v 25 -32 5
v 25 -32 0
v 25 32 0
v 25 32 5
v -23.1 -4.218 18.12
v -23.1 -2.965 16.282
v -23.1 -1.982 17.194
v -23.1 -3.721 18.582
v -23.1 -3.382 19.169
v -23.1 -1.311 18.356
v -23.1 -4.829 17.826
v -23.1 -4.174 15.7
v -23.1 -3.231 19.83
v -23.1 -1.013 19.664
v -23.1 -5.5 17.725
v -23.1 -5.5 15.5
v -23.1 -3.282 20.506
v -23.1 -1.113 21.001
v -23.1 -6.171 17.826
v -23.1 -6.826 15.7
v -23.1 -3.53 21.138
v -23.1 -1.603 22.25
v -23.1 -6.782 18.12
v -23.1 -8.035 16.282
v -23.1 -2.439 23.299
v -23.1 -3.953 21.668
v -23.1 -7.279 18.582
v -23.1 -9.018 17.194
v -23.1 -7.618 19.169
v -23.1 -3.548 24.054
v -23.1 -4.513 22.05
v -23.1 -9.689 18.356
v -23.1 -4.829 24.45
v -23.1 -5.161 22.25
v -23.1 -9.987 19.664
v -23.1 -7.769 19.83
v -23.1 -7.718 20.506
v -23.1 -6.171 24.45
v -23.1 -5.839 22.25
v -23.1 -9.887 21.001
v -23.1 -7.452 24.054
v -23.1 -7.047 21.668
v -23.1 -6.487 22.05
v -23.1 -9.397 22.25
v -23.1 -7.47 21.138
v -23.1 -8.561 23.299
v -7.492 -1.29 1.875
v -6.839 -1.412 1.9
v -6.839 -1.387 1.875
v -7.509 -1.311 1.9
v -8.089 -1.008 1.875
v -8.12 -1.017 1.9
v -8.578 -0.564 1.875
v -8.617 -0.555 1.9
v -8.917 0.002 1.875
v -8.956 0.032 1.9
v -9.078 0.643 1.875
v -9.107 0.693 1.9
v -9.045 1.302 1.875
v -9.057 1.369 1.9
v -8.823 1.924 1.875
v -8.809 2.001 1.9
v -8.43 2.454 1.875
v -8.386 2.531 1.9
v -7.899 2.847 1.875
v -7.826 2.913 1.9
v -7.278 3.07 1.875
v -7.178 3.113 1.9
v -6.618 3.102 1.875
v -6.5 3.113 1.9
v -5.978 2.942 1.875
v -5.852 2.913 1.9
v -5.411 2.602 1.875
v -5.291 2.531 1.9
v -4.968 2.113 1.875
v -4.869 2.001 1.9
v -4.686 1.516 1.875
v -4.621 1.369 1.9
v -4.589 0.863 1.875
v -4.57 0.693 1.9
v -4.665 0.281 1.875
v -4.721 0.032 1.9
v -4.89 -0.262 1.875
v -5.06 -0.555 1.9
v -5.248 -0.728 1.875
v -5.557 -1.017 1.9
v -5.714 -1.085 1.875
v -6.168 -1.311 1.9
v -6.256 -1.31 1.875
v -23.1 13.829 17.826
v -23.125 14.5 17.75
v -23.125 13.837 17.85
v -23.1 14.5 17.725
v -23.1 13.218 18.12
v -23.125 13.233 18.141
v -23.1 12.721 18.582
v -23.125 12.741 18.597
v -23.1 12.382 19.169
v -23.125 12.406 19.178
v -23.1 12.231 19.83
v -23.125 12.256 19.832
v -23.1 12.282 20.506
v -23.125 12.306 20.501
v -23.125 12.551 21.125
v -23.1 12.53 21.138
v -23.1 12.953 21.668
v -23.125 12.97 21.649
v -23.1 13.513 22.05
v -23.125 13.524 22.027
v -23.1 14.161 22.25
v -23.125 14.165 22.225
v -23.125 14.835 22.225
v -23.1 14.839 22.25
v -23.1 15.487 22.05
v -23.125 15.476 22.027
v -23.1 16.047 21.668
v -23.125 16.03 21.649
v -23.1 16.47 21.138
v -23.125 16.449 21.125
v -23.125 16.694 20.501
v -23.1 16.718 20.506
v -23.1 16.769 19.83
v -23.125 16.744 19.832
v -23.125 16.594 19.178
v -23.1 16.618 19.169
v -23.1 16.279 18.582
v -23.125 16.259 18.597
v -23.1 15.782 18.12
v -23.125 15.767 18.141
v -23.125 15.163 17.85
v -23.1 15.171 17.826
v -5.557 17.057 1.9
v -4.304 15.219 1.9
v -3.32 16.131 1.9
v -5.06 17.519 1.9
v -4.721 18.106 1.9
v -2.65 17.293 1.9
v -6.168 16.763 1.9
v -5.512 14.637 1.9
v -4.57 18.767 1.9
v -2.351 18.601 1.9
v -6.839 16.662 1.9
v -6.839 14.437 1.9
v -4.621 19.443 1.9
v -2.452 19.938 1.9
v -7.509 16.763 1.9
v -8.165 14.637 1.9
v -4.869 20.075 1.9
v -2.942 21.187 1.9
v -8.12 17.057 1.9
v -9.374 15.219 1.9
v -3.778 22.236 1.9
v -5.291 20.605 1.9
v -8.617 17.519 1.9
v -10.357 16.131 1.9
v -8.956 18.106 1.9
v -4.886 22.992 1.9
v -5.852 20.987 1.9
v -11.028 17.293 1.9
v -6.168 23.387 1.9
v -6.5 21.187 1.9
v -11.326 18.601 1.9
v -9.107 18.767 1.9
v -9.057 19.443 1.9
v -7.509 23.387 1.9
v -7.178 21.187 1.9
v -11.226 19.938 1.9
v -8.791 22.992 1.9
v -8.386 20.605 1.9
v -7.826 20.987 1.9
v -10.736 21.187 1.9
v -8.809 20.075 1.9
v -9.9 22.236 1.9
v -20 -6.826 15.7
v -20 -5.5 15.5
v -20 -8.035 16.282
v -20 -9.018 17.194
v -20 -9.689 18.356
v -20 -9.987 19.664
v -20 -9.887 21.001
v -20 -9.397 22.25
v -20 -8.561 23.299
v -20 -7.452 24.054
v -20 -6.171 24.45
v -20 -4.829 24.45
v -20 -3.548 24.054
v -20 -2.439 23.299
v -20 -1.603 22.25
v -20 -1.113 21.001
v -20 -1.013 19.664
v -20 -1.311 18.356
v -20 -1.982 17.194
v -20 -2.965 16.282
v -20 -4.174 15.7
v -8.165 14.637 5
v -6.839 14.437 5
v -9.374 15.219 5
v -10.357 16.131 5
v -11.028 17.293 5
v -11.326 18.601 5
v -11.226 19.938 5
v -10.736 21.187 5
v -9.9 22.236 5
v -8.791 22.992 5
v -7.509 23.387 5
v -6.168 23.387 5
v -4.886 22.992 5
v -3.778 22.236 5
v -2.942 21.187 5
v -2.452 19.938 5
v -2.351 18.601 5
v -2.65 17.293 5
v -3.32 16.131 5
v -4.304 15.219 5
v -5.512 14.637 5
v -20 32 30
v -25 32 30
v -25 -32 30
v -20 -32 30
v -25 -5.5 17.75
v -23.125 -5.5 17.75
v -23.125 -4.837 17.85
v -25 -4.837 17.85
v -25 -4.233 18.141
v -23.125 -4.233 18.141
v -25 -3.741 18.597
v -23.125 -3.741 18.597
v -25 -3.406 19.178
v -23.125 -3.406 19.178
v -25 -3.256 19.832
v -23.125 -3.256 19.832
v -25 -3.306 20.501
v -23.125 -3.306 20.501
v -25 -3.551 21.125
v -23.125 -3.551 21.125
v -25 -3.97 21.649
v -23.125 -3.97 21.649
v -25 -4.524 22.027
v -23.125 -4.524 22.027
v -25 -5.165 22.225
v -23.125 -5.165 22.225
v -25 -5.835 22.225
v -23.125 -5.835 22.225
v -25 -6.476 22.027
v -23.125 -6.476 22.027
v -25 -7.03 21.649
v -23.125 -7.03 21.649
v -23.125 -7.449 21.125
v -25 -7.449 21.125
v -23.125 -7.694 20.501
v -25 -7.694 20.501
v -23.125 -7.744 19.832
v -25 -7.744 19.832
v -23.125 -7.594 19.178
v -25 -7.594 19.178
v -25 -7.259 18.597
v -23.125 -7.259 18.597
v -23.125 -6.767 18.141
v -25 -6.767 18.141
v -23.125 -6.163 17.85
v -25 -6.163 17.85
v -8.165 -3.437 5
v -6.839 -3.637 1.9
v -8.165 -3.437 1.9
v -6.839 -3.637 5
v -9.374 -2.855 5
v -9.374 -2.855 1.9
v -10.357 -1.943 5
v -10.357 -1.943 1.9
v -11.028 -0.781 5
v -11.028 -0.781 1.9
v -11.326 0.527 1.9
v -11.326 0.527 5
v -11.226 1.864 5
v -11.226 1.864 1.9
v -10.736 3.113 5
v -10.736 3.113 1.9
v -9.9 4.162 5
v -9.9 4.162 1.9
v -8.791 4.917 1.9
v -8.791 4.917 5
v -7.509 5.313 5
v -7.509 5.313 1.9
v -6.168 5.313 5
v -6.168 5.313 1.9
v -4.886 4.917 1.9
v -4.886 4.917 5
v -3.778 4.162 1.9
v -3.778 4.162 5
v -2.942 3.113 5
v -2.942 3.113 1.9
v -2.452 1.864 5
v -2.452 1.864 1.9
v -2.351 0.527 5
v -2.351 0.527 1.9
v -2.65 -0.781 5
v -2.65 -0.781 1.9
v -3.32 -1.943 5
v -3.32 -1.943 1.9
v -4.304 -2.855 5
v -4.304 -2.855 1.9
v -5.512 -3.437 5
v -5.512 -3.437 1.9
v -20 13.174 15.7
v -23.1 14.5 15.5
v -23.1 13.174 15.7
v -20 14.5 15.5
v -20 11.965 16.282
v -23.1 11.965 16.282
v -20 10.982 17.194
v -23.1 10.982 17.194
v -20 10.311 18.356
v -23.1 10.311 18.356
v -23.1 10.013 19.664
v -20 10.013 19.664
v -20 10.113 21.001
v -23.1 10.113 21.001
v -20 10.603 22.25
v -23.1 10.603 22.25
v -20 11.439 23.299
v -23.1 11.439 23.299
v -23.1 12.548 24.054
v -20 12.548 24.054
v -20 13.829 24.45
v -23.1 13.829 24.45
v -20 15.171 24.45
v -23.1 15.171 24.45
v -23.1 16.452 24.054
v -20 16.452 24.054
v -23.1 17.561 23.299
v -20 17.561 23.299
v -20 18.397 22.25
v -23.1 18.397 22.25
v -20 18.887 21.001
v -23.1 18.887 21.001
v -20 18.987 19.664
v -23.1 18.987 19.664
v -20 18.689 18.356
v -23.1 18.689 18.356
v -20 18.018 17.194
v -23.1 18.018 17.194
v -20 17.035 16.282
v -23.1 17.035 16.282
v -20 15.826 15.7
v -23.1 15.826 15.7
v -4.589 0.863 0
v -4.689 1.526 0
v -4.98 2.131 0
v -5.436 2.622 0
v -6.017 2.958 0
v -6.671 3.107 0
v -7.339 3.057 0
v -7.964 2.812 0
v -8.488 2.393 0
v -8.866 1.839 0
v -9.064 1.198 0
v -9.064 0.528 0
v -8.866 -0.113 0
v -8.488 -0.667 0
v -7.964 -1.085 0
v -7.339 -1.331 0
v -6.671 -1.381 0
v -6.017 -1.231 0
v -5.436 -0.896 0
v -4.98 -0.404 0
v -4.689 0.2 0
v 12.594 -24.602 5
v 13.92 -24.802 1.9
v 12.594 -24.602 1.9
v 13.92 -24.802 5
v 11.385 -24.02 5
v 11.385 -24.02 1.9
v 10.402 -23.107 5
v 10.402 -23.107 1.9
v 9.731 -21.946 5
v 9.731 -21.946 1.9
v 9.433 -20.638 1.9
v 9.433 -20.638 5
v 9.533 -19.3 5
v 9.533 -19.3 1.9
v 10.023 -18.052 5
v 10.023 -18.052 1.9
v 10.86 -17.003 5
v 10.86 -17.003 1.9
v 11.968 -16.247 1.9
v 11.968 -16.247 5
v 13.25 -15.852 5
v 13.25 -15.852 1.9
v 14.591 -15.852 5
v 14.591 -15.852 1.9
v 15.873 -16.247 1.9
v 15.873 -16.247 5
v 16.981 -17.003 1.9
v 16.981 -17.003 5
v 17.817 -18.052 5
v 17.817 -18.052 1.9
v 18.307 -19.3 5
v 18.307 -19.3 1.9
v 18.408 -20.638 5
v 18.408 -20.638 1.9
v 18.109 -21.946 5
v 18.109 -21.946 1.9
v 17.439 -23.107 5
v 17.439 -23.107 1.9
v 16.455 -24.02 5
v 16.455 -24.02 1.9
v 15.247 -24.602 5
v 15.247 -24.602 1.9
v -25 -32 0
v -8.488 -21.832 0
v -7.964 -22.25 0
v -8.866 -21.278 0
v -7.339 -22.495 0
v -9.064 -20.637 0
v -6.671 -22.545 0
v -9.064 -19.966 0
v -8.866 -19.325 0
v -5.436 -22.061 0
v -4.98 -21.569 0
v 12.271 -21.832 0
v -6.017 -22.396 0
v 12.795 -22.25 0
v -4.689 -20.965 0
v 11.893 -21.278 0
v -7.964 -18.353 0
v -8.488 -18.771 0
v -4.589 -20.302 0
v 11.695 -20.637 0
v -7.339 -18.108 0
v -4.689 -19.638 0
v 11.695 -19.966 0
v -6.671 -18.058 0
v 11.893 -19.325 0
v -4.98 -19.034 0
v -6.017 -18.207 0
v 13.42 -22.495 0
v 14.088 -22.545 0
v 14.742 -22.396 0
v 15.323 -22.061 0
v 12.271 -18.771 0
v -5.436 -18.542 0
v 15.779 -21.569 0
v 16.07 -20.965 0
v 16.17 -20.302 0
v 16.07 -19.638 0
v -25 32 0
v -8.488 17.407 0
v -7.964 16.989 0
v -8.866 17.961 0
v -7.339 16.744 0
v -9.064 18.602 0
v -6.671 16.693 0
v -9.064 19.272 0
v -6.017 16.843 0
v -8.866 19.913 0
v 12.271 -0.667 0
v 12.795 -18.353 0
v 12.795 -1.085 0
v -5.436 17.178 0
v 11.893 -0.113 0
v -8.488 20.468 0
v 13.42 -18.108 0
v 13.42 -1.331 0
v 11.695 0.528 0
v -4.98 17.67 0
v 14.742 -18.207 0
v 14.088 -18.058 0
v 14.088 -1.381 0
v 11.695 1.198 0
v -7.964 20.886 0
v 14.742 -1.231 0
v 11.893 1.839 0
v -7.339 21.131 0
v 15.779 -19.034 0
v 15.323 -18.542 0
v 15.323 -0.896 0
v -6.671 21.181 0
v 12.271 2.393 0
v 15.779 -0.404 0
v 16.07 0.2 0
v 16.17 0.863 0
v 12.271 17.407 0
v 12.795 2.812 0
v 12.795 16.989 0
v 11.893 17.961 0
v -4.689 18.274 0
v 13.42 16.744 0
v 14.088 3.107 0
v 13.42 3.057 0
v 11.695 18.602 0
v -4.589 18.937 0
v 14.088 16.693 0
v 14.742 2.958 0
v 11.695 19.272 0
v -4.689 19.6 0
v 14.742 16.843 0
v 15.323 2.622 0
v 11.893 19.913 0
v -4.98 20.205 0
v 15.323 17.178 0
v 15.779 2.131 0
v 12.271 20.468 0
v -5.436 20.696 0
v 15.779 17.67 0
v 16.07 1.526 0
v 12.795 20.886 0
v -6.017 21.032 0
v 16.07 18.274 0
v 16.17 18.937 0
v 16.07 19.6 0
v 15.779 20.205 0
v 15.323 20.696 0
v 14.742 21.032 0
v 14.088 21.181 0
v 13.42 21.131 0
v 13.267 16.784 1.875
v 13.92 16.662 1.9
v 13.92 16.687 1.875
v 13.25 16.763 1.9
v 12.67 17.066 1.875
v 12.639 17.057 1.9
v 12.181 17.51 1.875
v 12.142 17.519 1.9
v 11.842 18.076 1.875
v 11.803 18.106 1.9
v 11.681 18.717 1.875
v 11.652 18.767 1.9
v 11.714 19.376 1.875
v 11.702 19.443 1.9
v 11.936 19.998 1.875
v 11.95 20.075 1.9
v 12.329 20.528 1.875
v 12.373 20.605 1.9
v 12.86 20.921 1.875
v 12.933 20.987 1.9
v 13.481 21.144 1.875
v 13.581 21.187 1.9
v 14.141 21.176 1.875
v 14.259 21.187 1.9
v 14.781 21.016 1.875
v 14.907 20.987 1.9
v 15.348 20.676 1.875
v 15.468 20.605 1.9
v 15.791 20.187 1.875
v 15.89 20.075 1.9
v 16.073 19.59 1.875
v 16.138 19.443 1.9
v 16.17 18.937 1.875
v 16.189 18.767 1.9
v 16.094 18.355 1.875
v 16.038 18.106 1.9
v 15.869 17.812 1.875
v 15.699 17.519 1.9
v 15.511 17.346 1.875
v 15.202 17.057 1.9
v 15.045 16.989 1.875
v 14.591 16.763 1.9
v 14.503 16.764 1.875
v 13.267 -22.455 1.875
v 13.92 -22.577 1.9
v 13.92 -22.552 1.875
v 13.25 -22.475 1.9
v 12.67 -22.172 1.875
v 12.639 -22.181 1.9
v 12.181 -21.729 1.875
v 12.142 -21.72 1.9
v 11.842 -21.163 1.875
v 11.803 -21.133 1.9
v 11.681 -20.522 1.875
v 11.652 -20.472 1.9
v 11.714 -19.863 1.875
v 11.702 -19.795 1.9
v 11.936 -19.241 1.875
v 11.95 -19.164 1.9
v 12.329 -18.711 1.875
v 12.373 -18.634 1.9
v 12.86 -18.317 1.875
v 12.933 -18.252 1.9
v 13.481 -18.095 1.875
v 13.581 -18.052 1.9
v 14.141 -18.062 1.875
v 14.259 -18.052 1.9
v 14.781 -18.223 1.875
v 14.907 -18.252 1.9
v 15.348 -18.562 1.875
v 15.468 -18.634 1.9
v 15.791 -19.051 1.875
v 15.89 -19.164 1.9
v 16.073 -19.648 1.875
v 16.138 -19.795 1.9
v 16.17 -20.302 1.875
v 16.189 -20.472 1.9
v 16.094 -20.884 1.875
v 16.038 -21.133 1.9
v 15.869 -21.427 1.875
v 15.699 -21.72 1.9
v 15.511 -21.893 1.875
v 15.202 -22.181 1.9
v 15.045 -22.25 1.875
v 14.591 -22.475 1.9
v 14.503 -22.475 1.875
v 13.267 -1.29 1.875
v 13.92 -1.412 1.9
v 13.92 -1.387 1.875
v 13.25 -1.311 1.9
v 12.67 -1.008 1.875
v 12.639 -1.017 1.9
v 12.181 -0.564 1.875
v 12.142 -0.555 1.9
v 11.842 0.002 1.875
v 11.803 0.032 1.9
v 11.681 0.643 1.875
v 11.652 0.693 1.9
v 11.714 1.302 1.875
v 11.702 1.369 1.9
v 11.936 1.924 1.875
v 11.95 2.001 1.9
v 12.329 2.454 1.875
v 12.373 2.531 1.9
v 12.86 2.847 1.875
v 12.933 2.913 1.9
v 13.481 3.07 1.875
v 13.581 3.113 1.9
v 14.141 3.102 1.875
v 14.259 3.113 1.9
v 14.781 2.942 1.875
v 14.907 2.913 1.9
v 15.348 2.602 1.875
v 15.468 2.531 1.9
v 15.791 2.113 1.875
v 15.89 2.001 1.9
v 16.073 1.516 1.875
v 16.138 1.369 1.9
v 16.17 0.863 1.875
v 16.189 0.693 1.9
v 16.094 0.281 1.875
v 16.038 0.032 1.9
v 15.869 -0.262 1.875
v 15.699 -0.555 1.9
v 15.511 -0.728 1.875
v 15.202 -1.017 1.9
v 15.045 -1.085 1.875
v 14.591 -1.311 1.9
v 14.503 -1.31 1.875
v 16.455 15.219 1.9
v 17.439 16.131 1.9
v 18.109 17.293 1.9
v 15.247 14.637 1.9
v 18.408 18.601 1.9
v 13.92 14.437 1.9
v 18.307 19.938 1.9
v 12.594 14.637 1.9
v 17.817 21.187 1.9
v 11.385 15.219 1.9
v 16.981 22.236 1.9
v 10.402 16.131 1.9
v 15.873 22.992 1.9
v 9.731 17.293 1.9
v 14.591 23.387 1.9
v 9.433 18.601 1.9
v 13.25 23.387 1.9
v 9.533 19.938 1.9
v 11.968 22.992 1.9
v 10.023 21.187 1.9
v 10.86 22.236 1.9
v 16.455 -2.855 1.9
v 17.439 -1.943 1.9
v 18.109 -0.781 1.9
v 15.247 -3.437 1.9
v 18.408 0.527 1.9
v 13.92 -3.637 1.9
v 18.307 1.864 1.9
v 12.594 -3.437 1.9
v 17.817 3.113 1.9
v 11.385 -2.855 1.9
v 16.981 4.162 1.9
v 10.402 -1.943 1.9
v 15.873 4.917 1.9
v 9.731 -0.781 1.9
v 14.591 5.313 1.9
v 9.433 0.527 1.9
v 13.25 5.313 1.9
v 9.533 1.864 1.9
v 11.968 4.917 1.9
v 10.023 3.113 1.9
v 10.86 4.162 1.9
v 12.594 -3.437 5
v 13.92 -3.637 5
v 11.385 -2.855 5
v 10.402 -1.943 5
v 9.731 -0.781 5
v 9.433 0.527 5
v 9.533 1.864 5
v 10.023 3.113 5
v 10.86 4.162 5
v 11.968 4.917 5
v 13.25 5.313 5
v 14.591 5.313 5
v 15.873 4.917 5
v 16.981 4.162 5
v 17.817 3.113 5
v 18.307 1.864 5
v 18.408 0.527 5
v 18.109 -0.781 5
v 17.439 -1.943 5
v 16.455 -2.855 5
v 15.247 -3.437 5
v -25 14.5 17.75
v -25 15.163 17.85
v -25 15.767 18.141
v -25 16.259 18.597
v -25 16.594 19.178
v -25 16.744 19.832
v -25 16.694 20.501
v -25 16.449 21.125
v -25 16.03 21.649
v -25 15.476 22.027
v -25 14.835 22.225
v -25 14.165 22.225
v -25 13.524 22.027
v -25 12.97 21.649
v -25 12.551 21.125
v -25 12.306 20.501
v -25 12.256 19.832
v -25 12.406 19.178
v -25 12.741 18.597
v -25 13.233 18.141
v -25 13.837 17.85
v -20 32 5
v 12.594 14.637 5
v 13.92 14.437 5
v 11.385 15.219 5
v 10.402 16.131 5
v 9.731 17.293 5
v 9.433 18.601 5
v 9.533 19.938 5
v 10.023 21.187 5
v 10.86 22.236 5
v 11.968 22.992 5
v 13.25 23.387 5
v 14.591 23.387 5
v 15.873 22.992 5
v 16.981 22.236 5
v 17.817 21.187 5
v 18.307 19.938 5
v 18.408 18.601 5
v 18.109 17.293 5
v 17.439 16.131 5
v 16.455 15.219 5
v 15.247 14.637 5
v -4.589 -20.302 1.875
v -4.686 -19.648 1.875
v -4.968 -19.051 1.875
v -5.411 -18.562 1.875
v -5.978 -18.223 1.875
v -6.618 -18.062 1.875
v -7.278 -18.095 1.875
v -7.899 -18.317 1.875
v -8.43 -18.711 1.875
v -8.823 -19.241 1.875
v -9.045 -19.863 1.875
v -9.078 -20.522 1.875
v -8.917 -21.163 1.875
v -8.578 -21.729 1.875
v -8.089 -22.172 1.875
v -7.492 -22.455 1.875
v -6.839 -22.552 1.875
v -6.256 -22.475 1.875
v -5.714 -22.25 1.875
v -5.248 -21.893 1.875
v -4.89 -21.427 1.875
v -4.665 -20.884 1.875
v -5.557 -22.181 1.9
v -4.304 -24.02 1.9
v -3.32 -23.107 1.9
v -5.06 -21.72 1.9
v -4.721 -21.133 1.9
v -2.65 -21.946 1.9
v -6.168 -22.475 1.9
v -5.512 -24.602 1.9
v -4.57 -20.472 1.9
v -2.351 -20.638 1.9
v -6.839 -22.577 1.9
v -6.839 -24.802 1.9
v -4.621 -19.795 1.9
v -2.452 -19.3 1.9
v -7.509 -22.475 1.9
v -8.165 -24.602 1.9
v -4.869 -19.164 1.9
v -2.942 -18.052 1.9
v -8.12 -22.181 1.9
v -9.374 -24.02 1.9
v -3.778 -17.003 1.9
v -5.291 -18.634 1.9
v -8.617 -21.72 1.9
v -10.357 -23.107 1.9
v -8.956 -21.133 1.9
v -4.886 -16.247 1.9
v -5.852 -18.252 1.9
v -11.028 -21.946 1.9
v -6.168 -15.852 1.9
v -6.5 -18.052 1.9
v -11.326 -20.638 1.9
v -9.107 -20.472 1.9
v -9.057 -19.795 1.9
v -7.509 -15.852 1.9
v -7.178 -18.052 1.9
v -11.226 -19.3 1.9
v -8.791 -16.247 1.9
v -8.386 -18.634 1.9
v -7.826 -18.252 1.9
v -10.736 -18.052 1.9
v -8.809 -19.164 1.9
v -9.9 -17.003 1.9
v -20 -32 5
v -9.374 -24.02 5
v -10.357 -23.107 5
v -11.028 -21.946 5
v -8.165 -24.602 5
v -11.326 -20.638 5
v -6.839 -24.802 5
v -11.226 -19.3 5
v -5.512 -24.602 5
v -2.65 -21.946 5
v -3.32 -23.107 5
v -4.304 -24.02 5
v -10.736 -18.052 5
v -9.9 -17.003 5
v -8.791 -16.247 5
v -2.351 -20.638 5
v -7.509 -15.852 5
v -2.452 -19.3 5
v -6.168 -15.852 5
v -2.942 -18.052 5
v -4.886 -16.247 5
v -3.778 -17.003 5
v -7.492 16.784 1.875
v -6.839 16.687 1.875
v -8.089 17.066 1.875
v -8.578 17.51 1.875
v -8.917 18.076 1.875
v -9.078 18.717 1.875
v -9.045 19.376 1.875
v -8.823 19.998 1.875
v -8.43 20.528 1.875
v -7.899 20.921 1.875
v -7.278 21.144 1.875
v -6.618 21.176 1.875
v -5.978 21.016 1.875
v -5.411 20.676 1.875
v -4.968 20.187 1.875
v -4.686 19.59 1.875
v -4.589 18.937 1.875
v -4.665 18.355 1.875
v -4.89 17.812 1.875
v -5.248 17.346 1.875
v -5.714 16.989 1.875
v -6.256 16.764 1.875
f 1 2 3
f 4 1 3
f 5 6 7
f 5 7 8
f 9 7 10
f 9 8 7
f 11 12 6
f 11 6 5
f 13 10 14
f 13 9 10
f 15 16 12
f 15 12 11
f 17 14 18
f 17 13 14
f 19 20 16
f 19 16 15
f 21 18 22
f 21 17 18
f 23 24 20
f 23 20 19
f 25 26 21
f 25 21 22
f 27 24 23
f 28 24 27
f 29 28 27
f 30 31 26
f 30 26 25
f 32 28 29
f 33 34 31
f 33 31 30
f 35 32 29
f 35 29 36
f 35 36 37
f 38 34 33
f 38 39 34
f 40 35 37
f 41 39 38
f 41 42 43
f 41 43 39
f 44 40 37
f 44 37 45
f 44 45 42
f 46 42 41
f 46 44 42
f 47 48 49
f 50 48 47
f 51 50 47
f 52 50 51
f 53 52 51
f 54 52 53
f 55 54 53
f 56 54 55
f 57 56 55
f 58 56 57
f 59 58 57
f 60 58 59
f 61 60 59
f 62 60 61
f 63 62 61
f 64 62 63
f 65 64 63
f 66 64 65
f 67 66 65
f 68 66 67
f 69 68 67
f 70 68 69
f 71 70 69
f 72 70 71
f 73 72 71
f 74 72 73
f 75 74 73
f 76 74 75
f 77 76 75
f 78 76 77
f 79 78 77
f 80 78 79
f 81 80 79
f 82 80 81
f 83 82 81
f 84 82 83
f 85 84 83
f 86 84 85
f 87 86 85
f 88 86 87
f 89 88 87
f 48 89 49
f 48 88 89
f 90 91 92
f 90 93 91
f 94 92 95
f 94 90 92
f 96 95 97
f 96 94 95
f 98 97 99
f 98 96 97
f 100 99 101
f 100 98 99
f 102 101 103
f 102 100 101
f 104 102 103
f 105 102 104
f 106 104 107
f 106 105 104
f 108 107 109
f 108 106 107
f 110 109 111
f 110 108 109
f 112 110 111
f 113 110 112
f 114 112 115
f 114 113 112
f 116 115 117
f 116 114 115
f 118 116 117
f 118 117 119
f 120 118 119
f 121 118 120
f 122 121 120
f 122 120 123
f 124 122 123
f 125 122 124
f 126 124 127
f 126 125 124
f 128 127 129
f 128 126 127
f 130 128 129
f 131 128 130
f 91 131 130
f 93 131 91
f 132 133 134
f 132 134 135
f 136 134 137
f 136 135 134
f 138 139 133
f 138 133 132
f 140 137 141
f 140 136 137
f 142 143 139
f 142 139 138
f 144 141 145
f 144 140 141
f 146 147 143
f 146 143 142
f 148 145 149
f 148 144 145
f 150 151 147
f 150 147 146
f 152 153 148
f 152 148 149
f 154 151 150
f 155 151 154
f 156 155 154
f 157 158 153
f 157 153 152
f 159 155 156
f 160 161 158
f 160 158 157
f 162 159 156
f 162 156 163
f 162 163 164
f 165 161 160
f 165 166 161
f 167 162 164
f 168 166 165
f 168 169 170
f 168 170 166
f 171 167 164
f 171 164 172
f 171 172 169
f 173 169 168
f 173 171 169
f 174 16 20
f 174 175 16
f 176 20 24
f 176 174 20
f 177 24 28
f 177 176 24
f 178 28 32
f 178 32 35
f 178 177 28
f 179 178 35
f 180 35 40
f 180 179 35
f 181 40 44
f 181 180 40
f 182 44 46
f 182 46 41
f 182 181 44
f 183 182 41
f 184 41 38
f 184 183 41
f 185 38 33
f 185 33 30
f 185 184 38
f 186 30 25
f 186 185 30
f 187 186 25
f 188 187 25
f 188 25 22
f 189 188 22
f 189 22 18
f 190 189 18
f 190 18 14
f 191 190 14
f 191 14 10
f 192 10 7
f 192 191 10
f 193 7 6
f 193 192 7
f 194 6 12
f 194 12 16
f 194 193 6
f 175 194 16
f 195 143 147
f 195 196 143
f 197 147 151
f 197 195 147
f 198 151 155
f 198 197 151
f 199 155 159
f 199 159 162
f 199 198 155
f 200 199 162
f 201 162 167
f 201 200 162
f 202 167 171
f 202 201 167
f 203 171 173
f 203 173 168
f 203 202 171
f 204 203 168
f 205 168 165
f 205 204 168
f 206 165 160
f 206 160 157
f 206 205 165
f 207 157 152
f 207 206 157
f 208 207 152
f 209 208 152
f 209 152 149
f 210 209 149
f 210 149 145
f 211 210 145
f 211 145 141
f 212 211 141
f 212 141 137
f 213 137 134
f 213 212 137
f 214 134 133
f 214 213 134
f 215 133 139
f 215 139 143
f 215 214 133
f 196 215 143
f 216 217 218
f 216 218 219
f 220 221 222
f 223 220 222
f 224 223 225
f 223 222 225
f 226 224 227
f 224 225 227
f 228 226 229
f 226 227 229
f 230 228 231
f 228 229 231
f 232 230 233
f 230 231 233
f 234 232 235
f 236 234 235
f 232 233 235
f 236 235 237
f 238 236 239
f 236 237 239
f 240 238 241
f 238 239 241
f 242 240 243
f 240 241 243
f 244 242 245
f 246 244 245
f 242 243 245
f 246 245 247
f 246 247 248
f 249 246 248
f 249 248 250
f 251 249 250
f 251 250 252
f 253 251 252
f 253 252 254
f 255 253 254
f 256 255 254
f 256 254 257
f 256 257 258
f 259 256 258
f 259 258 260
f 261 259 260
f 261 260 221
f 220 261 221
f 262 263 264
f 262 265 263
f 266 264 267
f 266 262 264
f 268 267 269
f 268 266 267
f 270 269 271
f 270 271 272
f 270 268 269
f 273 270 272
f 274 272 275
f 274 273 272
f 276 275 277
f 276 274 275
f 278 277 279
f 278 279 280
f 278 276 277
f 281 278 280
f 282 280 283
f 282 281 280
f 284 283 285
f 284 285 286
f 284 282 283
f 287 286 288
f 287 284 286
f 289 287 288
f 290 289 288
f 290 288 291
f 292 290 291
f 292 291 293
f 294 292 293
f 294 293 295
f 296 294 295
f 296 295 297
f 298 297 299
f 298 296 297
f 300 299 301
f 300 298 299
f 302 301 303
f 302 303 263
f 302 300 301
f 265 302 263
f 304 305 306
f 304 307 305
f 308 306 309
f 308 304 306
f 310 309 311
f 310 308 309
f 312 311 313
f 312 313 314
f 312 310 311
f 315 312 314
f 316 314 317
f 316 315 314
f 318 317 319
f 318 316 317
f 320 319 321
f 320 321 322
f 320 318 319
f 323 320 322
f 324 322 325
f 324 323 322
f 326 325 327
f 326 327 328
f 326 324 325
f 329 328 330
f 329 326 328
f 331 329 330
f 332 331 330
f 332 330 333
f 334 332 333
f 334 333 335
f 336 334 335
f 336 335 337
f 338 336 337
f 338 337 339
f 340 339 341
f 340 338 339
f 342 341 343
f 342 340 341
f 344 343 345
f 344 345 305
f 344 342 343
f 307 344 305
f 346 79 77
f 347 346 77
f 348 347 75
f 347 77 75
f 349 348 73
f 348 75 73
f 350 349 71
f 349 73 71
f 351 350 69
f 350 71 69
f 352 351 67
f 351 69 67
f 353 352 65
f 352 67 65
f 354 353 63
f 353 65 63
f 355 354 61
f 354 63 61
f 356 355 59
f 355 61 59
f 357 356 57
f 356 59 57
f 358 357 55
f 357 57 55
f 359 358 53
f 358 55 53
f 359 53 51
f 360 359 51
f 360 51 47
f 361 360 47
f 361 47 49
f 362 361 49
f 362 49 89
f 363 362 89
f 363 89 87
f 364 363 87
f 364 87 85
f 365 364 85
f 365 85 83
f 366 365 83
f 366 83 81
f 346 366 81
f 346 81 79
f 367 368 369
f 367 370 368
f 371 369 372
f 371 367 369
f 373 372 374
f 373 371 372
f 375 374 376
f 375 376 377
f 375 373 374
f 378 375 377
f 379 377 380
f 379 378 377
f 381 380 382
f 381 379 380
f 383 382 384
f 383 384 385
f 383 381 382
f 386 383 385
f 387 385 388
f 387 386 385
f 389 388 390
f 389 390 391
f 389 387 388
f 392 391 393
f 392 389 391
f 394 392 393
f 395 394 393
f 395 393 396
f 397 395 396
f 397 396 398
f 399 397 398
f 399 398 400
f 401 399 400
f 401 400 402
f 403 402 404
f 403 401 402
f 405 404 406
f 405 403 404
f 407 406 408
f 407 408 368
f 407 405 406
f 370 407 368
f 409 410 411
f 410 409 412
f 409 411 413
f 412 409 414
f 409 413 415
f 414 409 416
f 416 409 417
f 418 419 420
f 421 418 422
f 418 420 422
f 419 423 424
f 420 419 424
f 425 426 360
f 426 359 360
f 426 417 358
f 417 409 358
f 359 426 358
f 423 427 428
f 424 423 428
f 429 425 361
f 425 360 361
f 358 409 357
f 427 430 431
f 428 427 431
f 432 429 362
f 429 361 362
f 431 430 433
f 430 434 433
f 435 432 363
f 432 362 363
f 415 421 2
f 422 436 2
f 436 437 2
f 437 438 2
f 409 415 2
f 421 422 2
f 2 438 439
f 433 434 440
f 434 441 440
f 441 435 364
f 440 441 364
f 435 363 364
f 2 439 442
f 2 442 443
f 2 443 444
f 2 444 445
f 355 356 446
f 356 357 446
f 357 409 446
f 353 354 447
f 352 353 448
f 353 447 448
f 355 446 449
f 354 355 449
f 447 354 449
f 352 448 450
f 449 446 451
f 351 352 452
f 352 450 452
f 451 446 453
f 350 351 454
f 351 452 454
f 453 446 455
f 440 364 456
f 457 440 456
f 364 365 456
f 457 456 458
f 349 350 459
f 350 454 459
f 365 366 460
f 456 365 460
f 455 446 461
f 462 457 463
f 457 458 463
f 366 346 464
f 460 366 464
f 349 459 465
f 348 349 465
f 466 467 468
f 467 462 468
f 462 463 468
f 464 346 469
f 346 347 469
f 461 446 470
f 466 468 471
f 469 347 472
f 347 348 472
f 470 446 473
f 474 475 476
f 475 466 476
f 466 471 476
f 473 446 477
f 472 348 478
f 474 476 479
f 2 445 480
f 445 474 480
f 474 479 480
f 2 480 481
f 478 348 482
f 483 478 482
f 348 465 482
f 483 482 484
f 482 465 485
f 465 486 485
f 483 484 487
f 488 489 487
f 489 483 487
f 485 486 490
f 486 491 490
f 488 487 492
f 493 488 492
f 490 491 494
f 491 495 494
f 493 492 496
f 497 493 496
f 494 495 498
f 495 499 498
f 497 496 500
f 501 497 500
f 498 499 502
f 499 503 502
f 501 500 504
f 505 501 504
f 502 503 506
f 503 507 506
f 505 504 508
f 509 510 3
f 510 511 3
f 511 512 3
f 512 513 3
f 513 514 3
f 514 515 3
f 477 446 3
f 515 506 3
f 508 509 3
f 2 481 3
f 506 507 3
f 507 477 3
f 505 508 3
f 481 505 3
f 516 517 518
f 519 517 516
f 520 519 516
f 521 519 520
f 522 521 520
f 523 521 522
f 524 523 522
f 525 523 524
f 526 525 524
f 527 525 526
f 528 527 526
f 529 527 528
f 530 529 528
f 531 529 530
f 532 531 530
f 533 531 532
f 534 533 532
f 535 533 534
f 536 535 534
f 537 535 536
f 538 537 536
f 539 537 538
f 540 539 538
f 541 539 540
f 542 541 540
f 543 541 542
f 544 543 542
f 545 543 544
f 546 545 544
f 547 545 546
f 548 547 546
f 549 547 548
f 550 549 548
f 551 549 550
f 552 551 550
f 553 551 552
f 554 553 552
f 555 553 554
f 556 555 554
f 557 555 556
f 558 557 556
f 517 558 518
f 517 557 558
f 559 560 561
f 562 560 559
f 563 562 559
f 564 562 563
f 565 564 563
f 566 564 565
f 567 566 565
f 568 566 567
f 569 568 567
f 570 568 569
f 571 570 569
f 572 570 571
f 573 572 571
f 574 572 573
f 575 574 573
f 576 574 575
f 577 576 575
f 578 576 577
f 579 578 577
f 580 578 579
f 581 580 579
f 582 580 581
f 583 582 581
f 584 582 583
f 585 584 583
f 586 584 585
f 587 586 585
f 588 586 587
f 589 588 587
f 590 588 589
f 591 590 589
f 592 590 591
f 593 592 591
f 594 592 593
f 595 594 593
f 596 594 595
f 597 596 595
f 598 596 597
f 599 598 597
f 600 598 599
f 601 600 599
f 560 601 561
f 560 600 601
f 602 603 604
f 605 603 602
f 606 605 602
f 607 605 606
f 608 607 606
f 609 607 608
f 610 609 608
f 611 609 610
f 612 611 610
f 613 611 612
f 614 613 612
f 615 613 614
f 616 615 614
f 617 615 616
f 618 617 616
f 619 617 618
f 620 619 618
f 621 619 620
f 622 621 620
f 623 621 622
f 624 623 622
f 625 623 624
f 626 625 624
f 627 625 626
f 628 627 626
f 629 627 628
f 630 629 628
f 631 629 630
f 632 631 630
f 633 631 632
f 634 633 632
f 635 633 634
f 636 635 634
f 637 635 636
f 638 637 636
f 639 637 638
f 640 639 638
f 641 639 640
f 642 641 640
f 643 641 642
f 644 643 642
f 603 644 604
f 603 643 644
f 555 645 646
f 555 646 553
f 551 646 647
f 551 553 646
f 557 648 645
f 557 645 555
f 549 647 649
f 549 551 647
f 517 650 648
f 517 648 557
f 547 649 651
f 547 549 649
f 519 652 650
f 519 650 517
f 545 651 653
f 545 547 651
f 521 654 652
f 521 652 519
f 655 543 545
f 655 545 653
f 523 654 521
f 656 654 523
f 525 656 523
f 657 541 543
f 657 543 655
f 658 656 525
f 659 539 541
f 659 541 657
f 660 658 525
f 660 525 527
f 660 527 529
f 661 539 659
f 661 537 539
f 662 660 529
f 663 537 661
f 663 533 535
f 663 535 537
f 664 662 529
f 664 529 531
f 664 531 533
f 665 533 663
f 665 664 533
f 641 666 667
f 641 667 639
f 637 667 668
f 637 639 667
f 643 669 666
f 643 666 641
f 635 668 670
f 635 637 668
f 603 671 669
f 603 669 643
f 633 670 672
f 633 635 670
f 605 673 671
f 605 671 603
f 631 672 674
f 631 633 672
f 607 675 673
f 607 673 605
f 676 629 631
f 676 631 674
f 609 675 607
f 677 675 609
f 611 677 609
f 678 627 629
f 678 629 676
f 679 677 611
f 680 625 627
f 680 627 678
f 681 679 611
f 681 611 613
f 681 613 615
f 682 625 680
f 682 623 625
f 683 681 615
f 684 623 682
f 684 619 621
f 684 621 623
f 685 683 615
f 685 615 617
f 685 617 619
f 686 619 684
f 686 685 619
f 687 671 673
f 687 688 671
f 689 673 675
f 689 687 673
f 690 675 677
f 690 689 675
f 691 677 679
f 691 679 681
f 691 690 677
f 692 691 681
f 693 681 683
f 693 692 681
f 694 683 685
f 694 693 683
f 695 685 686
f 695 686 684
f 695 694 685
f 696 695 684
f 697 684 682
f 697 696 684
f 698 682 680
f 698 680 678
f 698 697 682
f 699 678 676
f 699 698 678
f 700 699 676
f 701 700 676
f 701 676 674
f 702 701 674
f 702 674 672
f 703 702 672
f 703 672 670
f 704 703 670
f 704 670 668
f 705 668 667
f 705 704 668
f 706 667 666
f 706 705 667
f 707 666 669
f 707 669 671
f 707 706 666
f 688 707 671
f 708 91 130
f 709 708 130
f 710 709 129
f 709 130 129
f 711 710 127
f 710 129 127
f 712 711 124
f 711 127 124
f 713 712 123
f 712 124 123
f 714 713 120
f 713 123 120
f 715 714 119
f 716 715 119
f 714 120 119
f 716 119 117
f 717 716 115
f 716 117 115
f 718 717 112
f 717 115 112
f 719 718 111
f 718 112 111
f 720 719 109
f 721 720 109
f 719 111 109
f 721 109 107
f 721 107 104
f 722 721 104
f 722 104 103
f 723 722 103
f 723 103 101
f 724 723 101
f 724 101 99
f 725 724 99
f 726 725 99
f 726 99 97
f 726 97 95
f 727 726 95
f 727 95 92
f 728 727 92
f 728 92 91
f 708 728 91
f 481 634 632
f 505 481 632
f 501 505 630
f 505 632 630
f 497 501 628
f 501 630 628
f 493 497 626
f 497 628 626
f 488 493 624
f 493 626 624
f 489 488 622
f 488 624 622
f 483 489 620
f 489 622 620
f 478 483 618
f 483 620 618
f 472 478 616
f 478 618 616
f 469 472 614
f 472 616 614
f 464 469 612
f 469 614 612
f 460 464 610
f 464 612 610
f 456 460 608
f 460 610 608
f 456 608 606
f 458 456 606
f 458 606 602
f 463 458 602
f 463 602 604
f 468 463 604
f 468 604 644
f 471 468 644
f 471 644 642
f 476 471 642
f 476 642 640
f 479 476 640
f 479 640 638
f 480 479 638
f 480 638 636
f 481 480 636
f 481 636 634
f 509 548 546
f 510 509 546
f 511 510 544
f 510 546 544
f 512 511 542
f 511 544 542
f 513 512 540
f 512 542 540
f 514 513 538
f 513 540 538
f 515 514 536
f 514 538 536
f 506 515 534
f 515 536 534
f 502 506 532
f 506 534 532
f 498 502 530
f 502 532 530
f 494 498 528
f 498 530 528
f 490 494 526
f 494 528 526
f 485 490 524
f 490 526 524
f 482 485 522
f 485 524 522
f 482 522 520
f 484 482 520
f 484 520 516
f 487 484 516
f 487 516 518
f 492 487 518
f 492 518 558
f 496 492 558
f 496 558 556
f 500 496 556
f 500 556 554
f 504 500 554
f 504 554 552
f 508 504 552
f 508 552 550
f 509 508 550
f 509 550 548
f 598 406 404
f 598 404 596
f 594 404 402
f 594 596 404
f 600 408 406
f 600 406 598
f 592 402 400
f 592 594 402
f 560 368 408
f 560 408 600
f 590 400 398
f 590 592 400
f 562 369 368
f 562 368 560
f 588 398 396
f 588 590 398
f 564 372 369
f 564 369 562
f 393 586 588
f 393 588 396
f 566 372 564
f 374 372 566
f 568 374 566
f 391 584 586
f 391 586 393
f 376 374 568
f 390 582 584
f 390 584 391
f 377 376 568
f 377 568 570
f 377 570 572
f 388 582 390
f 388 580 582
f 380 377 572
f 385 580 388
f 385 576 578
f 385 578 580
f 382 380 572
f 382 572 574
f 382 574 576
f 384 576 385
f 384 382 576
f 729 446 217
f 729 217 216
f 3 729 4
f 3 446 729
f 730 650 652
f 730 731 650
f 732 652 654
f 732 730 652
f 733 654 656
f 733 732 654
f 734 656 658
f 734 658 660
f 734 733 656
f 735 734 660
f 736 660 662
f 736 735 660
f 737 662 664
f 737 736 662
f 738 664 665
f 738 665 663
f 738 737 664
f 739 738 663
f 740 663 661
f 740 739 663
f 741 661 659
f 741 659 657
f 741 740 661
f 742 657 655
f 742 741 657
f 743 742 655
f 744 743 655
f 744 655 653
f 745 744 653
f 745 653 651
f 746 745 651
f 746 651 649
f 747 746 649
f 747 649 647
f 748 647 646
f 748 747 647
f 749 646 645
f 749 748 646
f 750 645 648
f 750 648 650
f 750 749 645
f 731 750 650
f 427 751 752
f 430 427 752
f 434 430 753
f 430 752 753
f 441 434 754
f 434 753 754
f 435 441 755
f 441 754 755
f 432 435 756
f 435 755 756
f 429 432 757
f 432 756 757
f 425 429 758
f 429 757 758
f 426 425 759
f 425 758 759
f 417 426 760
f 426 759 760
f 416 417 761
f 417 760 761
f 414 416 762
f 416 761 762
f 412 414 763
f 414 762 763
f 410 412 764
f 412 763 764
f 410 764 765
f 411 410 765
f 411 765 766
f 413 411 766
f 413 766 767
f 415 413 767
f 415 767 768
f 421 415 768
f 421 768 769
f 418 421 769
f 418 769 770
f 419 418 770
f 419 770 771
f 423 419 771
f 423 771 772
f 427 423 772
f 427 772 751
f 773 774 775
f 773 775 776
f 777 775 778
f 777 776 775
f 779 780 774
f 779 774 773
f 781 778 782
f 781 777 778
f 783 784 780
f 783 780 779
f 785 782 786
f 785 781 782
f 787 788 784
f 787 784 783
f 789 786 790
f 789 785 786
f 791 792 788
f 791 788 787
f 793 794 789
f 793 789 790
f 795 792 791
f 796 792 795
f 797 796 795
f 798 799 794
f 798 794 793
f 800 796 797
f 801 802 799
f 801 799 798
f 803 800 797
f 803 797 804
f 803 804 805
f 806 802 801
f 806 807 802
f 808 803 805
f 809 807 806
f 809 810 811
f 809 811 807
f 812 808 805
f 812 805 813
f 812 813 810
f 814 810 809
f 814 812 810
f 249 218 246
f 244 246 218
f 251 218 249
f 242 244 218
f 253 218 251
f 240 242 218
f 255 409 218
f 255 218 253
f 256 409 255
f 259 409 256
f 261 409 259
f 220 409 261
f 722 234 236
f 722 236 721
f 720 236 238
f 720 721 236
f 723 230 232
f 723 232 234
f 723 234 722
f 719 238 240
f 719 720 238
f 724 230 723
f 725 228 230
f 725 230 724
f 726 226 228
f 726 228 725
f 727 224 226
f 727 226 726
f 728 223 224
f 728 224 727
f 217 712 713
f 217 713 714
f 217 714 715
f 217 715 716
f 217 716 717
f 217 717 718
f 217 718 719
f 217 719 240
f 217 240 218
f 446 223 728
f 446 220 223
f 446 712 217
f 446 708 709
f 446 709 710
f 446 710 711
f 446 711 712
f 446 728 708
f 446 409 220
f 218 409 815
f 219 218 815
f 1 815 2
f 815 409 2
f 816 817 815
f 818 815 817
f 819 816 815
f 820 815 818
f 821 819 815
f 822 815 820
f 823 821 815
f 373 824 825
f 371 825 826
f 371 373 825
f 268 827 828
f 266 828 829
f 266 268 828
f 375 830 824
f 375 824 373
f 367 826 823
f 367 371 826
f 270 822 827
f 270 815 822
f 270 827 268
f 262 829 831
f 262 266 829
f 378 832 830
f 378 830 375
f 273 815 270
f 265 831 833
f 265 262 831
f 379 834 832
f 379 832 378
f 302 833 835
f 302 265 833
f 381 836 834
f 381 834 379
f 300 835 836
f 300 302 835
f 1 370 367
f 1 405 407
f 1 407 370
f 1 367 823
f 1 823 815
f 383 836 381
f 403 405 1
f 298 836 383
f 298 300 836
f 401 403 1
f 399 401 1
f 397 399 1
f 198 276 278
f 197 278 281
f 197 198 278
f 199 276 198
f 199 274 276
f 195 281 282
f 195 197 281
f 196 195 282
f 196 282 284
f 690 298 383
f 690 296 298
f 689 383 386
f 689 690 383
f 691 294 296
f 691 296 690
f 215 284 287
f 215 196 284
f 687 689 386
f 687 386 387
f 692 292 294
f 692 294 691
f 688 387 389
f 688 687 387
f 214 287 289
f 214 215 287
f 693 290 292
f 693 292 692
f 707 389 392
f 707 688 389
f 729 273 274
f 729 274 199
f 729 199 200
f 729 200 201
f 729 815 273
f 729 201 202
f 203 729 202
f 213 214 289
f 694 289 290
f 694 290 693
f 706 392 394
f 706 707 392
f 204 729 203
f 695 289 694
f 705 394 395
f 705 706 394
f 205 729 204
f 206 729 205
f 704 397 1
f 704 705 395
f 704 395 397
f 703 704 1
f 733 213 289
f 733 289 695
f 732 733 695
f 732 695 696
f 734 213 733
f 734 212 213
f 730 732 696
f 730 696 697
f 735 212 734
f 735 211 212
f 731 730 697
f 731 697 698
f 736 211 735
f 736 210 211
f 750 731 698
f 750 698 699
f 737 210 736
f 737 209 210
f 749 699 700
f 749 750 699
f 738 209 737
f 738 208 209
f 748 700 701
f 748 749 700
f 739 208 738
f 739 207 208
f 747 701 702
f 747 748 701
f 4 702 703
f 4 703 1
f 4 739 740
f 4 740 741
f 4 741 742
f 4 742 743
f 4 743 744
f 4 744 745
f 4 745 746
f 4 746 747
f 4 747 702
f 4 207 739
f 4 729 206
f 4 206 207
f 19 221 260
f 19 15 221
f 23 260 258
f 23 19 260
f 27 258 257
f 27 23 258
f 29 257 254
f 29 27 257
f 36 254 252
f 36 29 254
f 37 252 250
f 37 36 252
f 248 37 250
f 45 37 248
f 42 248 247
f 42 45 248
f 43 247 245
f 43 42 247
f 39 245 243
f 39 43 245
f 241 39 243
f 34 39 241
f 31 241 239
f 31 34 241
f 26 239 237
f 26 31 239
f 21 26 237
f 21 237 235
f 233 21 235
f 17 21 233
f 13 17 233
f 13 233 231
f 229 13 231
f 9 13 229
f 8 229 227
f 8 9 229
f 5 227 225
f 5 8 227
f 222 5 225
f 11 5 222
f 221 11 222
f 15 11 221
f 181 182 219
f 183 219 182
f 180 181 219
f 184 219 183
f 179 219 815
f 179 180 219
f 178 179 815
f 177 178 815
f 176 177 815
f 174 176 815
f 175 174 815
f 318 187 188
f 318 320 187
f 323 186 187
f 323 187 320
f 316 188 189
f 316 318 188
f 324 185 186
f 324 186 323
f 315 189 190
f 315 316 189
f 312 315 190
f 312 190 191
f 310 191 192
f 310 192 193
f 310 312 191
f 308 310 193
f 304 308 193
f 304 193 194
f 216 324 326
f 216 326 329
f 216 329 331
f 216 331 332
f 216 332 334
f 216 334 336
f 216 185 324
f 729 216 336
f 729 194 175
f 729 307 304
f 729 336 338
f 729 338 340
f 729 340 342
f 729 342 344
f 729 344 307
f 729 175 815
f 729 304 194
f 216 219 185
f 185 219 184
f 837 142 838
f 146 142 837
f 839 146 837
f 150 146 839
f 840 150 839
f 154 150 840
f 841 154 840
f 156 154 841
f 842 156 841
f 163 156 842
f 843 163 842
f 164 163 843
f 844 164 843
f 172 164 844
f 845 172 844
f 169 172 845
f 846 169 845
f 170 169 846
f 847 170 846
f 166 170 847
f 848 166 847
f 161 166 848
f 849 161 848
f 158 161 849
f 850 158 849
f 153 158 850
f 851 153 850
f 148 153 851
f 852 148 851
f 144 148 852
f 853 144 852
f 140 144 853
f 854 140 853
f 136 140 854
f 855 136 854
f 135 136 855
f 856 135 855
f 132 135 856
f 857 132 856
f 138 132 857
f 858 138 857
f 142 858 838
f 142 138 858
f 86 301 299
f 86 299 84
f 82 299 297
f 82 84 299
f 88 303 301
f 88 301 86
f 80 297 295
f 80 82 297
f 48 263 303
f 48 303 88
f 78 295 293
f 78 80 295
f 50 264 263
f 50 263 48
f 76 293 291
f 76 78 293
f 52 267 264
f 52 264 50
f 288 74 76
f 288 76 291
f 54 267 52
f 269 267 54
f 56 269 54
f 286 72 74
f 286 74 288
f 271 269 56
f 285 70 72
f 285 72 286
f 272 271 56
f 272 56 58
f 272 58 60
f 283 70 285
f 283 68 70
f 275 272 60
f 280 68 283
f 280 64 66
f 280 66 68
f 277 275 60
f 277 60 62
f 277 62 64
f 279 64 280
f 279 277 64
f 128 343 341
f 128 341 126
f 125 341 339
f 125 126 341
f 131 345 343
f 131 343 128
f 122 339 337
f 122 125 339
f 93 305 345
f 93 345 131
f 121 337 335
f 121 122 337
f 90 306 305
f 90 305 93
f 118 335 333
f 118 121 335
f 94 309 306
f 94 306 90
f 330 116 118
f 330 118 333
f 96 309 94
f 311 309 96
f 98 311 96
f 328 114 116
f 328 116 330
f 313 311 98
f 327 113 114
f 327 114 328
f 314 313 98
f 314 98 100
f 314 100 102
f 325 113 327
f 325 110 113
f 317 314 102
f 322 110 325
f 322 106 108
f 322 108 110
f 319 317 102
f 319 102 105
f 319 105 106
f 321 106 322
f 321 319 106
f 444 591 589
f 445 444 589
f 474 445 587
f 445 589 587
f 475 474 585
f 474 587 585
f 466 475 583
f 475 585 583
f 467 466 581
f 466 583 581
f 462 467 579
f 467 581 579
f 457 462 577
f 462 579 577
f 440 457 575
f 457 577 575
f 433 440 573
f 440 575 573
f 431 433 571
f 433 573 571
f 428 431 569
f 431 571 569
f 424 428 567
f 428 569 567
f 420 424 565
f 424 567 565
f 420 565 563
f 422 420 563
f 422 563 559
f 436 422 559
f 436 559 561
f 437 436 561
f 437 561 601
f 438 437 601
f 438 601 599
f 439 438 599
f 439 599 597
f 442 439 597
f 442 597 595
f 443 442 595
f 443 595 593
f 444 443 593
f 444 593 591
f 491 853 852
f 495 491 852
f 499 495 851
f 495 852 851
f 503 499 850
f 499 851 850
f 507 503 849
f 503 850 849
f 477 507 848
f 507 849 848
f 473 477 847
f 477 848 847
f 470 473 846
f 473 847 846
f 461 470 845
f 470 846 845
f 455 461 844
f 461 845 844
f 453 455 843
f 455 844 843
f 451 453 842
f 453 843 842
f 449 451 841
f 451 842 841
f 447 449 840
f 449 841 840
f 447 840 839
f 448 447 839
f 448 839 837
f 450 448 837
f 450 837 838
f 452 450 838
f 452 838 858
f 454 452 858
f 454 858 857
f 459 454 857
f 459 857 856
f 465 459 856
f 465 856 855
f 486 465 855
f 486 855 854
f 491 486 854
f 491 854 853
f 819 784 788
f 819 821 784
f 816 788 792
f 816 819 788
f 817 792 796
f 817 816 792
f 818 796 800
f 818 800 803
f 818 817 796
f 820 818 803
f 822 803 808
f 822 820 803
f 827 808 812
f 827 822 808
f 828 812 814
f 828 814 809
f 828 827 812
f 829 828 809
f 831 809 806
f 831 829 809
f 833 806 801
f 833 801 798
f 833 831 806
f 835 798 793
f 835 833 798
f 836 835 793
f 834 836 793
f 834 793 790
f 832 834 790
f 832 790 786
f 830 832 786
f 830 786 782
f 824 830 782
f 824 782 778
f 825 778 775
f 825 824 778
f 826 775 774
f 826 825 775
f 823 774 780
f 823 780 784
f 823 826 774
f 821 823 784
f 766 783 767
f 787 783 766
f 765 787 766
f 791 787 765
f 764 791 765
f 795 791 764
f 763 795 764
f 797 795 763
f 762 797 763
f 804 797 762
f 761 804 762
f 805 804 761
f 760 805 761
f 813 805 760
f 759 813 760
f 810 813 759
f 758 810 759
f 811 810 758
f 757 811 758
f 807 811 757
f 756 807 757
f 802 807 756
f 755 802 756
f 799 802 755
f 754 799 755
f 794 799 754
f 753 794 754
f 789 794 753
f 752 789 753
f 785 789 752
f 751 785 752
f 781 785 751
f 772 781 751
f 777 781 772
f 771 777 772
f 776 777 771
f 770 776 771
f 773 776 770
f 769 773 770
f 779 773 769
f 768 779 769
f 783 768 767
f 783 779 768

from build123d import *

# Parameters (mm, degrees)
ESQUISSE1_W                                  = 50
ESQUISSE1_H                                  = 64
BOSS_EXTRU_1_DEPTH                           = 30
ESQUISSE2_W                                  = 58.443807101
ESQUISSE2_H                                  = 34.604437798
ENL_V_MAT_EXTRU_1_DEPTH                      = 75.973328591
D_GAGEMENT_M41_D                             = 4.5
D_GAGEMENT_M42_D                             = 4.5
CHAMBRAGE_POUR_VIS_T_TE_RONDE_BOMB_2_COUNT   = 2
CHAMBRAGE_POUR_VIS_T_TE_RONDE_BOMB_2_PITCH   = 20.75901561
CHAMBRAGE_POUR_VIS_T_TE_RONDE_BOMB_3_COUNT   = 2
CHAMBRAGE_POUR_VIS_T_TE_RONDE_BOMB_3_PITCH   = 18.074069798
CHAMBRAGE_POUR_VIS_T_TE_RONDE_BOMB_4_COUNT   = 2
CHAMBRAGE_POUR_VIS_T_TE_RONDE_BOMB_4_PITCH   = 27.524693062
CHAMBRAGE_POUR_VIS_T_TE_RONDE_BOMB_5_COUNT   = 2
CHAMBRAGE_POUR_VIS_T_TE_RONDE_BOMB_5_PITCH   = 39.238665714
CHAMBRAGE_POUR_VIS_T_TE_RONDE_BOMB_6_COUNT   = 2
CHAMBRAGE_POUR_VIS_T_TE_RONDE_BOMB_6_PITCH   = 44.391548927
CHAMBRAGE_POUR_VIS_T_TE_RONDE_BOMB_7_A_COUNT = 2
CHAMBRAGE_POUR_VIS_T_TE_RONDE_BOMB_7_A_PITCH = 20


with BuildPart() as part:
    # Esquisse1 → Boss.-Extru.1 (new body)
    with BuildSketch(Plane.XY):
        Rectangle(ESQUISSE1_W, ESQUISSE1_H)
    extrude(amount=BOSS_EXTRU_1_DEPTH)

    # Esquisse2 → Enlèv. mat.-Extru.1 (cut, through all)
    with BuildSketch(Plane(origin=(0, 32, 0), x_dir=(1, 0, 0), z_dir=(0, 1, 0))):
        with Locations((9.221903551, -22.302218899)):
            Rectangle(ESQUISSE2_W, ESQUISSE2_H)
    extrude(amount=-ENL_V_MAT_EXTRU_1_DEPTH, mode=Mode.SUBTRACT)

    # Dégagement M41 (through all)
    with Locations(Plane(origin=(0, 0, 0), x_dir=(-1, 0, 0), z_dir=(0, 0, -1))):
        with Locations((6.838730229, 18.937151978), (-13.92028538, 18.937151978), (-13.92028538, 0.86308218), (6.838730229, 0.86308218), (6.838730229, -20.301513736), (-13.92028538, -20.301513736)):
            Hole(D_GAGEMENT_M41_D / 2)

    # Dégagement M42 (through all)
    with Locations(Plane.ZY.offset(25)):
        with Locations((20, 14.5), (20, -5.5)):
            Hole(D_GAGEMENT_M42_D / 2)

    # Esquisse7 → Chambrage pour vis _ t_te ronde bomb_e M (revolve, cut)
    with BuildSketch(Plane(origin=(13.92028538, 18.937151978, 5), x_dir=(0, -1, 0), z_dir=(1, 0, 0))):
        Polygon((0, 0), (0, 5), (2.25, 5), (2.25, 3.125), (2.275, 3.1), (4.5, 3.1), (4.5, 0), align=None)
    chambrage_pour_vis_t_te_ronde_bomb_e_m = revolve(axis=Axis((13.92028538, 18.937151978, 11.35), (0, 0, -1)), mode=Mode.SUBTRACT)

    # Chambrage pour vis _ t_te ronde bomb 2: Chambrage pour vis _ t_te ronde bomb_e M ×2
    with Locations(*[(-i * CHAMBRAGE_POUR_VIS_T_TE_RONDE_BOMB_2_PITCH, 0, 0) for i in range(1, CHAMBRAGE_POUR_VIS_T_TE_RONDE_BOMB_2_COUNT)]):
        add(chambrage_pour_vis_t_te_ronde_bomb_e_m, mode=Mode.SUBTRACT)

    # Chambrage pour vis _ t_te ronde bomb 3: Chambrage pour vis _ t_te ronde bomb_e M ×2
    with Locations(*[(0, -i * CHAMBRAGE_POUR_VIS_T_TE_RONDE_BOMB_3_PITCH, 0) for i in range(1, CHAMBRAGE_POUR_VIS_T_TE_RONDE_BOMB_3_COUNT)]):
        add(chambrage_pour_vis_t_te_ronde_bomb_e_m, mode=Mode.SUBTRACT)

    # Chambrage pour vis _ t_te ronde bomb 4: Chambrage pour vis _ t_te ronde bomb_e M ×2
    with Locations(*[Vector(-0.7541960799735443, -0.6566492769755702, 0) * (i * CHAMBRAGE_POUR_VIS_T_TE_RONDE_BOMB_4_PITCH) for i in range(1, CHAMBRAGE_POUR_VIS_T_TE_RONDE_BOMB_4_COUNT)]):
        add(chambrage_pour_vis_t_te_ronde_bomb_e_m, mode=Mode.SUBTRACT)

    # Chambrage pour vis _ t_te ronde bomb 5: Chambrage pour vis _ t_te ronde bomb_e M ×2
    with Locations(*[(0, -i * CHAMBRAGE_POUR_VIS_T_TE_RONDE_BOMB_5_PITCH, 0) for i in range(1, CHAMBRAGE_POUR_VIS_T_TE_RONDE_BOMB_5_COUNT)]):
        add(chambrage_pour_vis_t_te_ronde_bomb_e_m, mode=Mode.SUBTRACT)

    # Chambrage pour vis _ t_te ronde bomb 6: Chambrage pour vis _ t_te ronde bomb_e M ×2
    with Locations(*[Vector(-0.46763440590484284, -0.8839219775602509, 0) * (i * CHAMBRAGE_POUR_VIS_T_TE_RONDE_BOMB_6_PITCH) for i in range(1, CHAMBRAGE_POUR_VIS_T_TE_RONDE_BOMB_6_COUNT)]):
        add(chambrage_pour_vis_t_te_ronde_bomb_e_m, mode=Mode.SUBTRACT)

    # Esquisse9 → Chambrage pour vis _ t_te ronde bomb 7 (revolve, cut)
    with BuildSketch(Plane(origin=(-20, 14.5, 20), x_dir=(0, 0, -1), z_dir=(0, 1, 0))):
        Polygon((0, 0), (0, 5), (2.25, 5), (2.25, 3.125), (2.275, 3.1), (4.5, 3.1), (4.5, 0), align=None)
    chambrage_pour_vis_t_te_ronde_bomb_7 = revolve(axis=Axis((-13.65, 14.5, 20), (-1, 0, 0)), mode=Mode.SUBTRACT)

    # Chambrage pour vis _ t_te ronde bomb 7 a: Chambrage pour vis _ t_te ronde bomb 7 ×2
    with Locations(*[(0, -i * CHAMBRAGE_POUR_VIS_T_TE_RONDE_BOMB_7_A_PITCH, 0) for i in range(1, CHAMBRAGE_POUR_VIS_T_TE_RONDE_BOMB_7_A_COUNT)]):
        add(chambrage_pour_vis_t_te_ronde_bomb_7, mode=Mode.SUBTRACT)


solid = part.part
